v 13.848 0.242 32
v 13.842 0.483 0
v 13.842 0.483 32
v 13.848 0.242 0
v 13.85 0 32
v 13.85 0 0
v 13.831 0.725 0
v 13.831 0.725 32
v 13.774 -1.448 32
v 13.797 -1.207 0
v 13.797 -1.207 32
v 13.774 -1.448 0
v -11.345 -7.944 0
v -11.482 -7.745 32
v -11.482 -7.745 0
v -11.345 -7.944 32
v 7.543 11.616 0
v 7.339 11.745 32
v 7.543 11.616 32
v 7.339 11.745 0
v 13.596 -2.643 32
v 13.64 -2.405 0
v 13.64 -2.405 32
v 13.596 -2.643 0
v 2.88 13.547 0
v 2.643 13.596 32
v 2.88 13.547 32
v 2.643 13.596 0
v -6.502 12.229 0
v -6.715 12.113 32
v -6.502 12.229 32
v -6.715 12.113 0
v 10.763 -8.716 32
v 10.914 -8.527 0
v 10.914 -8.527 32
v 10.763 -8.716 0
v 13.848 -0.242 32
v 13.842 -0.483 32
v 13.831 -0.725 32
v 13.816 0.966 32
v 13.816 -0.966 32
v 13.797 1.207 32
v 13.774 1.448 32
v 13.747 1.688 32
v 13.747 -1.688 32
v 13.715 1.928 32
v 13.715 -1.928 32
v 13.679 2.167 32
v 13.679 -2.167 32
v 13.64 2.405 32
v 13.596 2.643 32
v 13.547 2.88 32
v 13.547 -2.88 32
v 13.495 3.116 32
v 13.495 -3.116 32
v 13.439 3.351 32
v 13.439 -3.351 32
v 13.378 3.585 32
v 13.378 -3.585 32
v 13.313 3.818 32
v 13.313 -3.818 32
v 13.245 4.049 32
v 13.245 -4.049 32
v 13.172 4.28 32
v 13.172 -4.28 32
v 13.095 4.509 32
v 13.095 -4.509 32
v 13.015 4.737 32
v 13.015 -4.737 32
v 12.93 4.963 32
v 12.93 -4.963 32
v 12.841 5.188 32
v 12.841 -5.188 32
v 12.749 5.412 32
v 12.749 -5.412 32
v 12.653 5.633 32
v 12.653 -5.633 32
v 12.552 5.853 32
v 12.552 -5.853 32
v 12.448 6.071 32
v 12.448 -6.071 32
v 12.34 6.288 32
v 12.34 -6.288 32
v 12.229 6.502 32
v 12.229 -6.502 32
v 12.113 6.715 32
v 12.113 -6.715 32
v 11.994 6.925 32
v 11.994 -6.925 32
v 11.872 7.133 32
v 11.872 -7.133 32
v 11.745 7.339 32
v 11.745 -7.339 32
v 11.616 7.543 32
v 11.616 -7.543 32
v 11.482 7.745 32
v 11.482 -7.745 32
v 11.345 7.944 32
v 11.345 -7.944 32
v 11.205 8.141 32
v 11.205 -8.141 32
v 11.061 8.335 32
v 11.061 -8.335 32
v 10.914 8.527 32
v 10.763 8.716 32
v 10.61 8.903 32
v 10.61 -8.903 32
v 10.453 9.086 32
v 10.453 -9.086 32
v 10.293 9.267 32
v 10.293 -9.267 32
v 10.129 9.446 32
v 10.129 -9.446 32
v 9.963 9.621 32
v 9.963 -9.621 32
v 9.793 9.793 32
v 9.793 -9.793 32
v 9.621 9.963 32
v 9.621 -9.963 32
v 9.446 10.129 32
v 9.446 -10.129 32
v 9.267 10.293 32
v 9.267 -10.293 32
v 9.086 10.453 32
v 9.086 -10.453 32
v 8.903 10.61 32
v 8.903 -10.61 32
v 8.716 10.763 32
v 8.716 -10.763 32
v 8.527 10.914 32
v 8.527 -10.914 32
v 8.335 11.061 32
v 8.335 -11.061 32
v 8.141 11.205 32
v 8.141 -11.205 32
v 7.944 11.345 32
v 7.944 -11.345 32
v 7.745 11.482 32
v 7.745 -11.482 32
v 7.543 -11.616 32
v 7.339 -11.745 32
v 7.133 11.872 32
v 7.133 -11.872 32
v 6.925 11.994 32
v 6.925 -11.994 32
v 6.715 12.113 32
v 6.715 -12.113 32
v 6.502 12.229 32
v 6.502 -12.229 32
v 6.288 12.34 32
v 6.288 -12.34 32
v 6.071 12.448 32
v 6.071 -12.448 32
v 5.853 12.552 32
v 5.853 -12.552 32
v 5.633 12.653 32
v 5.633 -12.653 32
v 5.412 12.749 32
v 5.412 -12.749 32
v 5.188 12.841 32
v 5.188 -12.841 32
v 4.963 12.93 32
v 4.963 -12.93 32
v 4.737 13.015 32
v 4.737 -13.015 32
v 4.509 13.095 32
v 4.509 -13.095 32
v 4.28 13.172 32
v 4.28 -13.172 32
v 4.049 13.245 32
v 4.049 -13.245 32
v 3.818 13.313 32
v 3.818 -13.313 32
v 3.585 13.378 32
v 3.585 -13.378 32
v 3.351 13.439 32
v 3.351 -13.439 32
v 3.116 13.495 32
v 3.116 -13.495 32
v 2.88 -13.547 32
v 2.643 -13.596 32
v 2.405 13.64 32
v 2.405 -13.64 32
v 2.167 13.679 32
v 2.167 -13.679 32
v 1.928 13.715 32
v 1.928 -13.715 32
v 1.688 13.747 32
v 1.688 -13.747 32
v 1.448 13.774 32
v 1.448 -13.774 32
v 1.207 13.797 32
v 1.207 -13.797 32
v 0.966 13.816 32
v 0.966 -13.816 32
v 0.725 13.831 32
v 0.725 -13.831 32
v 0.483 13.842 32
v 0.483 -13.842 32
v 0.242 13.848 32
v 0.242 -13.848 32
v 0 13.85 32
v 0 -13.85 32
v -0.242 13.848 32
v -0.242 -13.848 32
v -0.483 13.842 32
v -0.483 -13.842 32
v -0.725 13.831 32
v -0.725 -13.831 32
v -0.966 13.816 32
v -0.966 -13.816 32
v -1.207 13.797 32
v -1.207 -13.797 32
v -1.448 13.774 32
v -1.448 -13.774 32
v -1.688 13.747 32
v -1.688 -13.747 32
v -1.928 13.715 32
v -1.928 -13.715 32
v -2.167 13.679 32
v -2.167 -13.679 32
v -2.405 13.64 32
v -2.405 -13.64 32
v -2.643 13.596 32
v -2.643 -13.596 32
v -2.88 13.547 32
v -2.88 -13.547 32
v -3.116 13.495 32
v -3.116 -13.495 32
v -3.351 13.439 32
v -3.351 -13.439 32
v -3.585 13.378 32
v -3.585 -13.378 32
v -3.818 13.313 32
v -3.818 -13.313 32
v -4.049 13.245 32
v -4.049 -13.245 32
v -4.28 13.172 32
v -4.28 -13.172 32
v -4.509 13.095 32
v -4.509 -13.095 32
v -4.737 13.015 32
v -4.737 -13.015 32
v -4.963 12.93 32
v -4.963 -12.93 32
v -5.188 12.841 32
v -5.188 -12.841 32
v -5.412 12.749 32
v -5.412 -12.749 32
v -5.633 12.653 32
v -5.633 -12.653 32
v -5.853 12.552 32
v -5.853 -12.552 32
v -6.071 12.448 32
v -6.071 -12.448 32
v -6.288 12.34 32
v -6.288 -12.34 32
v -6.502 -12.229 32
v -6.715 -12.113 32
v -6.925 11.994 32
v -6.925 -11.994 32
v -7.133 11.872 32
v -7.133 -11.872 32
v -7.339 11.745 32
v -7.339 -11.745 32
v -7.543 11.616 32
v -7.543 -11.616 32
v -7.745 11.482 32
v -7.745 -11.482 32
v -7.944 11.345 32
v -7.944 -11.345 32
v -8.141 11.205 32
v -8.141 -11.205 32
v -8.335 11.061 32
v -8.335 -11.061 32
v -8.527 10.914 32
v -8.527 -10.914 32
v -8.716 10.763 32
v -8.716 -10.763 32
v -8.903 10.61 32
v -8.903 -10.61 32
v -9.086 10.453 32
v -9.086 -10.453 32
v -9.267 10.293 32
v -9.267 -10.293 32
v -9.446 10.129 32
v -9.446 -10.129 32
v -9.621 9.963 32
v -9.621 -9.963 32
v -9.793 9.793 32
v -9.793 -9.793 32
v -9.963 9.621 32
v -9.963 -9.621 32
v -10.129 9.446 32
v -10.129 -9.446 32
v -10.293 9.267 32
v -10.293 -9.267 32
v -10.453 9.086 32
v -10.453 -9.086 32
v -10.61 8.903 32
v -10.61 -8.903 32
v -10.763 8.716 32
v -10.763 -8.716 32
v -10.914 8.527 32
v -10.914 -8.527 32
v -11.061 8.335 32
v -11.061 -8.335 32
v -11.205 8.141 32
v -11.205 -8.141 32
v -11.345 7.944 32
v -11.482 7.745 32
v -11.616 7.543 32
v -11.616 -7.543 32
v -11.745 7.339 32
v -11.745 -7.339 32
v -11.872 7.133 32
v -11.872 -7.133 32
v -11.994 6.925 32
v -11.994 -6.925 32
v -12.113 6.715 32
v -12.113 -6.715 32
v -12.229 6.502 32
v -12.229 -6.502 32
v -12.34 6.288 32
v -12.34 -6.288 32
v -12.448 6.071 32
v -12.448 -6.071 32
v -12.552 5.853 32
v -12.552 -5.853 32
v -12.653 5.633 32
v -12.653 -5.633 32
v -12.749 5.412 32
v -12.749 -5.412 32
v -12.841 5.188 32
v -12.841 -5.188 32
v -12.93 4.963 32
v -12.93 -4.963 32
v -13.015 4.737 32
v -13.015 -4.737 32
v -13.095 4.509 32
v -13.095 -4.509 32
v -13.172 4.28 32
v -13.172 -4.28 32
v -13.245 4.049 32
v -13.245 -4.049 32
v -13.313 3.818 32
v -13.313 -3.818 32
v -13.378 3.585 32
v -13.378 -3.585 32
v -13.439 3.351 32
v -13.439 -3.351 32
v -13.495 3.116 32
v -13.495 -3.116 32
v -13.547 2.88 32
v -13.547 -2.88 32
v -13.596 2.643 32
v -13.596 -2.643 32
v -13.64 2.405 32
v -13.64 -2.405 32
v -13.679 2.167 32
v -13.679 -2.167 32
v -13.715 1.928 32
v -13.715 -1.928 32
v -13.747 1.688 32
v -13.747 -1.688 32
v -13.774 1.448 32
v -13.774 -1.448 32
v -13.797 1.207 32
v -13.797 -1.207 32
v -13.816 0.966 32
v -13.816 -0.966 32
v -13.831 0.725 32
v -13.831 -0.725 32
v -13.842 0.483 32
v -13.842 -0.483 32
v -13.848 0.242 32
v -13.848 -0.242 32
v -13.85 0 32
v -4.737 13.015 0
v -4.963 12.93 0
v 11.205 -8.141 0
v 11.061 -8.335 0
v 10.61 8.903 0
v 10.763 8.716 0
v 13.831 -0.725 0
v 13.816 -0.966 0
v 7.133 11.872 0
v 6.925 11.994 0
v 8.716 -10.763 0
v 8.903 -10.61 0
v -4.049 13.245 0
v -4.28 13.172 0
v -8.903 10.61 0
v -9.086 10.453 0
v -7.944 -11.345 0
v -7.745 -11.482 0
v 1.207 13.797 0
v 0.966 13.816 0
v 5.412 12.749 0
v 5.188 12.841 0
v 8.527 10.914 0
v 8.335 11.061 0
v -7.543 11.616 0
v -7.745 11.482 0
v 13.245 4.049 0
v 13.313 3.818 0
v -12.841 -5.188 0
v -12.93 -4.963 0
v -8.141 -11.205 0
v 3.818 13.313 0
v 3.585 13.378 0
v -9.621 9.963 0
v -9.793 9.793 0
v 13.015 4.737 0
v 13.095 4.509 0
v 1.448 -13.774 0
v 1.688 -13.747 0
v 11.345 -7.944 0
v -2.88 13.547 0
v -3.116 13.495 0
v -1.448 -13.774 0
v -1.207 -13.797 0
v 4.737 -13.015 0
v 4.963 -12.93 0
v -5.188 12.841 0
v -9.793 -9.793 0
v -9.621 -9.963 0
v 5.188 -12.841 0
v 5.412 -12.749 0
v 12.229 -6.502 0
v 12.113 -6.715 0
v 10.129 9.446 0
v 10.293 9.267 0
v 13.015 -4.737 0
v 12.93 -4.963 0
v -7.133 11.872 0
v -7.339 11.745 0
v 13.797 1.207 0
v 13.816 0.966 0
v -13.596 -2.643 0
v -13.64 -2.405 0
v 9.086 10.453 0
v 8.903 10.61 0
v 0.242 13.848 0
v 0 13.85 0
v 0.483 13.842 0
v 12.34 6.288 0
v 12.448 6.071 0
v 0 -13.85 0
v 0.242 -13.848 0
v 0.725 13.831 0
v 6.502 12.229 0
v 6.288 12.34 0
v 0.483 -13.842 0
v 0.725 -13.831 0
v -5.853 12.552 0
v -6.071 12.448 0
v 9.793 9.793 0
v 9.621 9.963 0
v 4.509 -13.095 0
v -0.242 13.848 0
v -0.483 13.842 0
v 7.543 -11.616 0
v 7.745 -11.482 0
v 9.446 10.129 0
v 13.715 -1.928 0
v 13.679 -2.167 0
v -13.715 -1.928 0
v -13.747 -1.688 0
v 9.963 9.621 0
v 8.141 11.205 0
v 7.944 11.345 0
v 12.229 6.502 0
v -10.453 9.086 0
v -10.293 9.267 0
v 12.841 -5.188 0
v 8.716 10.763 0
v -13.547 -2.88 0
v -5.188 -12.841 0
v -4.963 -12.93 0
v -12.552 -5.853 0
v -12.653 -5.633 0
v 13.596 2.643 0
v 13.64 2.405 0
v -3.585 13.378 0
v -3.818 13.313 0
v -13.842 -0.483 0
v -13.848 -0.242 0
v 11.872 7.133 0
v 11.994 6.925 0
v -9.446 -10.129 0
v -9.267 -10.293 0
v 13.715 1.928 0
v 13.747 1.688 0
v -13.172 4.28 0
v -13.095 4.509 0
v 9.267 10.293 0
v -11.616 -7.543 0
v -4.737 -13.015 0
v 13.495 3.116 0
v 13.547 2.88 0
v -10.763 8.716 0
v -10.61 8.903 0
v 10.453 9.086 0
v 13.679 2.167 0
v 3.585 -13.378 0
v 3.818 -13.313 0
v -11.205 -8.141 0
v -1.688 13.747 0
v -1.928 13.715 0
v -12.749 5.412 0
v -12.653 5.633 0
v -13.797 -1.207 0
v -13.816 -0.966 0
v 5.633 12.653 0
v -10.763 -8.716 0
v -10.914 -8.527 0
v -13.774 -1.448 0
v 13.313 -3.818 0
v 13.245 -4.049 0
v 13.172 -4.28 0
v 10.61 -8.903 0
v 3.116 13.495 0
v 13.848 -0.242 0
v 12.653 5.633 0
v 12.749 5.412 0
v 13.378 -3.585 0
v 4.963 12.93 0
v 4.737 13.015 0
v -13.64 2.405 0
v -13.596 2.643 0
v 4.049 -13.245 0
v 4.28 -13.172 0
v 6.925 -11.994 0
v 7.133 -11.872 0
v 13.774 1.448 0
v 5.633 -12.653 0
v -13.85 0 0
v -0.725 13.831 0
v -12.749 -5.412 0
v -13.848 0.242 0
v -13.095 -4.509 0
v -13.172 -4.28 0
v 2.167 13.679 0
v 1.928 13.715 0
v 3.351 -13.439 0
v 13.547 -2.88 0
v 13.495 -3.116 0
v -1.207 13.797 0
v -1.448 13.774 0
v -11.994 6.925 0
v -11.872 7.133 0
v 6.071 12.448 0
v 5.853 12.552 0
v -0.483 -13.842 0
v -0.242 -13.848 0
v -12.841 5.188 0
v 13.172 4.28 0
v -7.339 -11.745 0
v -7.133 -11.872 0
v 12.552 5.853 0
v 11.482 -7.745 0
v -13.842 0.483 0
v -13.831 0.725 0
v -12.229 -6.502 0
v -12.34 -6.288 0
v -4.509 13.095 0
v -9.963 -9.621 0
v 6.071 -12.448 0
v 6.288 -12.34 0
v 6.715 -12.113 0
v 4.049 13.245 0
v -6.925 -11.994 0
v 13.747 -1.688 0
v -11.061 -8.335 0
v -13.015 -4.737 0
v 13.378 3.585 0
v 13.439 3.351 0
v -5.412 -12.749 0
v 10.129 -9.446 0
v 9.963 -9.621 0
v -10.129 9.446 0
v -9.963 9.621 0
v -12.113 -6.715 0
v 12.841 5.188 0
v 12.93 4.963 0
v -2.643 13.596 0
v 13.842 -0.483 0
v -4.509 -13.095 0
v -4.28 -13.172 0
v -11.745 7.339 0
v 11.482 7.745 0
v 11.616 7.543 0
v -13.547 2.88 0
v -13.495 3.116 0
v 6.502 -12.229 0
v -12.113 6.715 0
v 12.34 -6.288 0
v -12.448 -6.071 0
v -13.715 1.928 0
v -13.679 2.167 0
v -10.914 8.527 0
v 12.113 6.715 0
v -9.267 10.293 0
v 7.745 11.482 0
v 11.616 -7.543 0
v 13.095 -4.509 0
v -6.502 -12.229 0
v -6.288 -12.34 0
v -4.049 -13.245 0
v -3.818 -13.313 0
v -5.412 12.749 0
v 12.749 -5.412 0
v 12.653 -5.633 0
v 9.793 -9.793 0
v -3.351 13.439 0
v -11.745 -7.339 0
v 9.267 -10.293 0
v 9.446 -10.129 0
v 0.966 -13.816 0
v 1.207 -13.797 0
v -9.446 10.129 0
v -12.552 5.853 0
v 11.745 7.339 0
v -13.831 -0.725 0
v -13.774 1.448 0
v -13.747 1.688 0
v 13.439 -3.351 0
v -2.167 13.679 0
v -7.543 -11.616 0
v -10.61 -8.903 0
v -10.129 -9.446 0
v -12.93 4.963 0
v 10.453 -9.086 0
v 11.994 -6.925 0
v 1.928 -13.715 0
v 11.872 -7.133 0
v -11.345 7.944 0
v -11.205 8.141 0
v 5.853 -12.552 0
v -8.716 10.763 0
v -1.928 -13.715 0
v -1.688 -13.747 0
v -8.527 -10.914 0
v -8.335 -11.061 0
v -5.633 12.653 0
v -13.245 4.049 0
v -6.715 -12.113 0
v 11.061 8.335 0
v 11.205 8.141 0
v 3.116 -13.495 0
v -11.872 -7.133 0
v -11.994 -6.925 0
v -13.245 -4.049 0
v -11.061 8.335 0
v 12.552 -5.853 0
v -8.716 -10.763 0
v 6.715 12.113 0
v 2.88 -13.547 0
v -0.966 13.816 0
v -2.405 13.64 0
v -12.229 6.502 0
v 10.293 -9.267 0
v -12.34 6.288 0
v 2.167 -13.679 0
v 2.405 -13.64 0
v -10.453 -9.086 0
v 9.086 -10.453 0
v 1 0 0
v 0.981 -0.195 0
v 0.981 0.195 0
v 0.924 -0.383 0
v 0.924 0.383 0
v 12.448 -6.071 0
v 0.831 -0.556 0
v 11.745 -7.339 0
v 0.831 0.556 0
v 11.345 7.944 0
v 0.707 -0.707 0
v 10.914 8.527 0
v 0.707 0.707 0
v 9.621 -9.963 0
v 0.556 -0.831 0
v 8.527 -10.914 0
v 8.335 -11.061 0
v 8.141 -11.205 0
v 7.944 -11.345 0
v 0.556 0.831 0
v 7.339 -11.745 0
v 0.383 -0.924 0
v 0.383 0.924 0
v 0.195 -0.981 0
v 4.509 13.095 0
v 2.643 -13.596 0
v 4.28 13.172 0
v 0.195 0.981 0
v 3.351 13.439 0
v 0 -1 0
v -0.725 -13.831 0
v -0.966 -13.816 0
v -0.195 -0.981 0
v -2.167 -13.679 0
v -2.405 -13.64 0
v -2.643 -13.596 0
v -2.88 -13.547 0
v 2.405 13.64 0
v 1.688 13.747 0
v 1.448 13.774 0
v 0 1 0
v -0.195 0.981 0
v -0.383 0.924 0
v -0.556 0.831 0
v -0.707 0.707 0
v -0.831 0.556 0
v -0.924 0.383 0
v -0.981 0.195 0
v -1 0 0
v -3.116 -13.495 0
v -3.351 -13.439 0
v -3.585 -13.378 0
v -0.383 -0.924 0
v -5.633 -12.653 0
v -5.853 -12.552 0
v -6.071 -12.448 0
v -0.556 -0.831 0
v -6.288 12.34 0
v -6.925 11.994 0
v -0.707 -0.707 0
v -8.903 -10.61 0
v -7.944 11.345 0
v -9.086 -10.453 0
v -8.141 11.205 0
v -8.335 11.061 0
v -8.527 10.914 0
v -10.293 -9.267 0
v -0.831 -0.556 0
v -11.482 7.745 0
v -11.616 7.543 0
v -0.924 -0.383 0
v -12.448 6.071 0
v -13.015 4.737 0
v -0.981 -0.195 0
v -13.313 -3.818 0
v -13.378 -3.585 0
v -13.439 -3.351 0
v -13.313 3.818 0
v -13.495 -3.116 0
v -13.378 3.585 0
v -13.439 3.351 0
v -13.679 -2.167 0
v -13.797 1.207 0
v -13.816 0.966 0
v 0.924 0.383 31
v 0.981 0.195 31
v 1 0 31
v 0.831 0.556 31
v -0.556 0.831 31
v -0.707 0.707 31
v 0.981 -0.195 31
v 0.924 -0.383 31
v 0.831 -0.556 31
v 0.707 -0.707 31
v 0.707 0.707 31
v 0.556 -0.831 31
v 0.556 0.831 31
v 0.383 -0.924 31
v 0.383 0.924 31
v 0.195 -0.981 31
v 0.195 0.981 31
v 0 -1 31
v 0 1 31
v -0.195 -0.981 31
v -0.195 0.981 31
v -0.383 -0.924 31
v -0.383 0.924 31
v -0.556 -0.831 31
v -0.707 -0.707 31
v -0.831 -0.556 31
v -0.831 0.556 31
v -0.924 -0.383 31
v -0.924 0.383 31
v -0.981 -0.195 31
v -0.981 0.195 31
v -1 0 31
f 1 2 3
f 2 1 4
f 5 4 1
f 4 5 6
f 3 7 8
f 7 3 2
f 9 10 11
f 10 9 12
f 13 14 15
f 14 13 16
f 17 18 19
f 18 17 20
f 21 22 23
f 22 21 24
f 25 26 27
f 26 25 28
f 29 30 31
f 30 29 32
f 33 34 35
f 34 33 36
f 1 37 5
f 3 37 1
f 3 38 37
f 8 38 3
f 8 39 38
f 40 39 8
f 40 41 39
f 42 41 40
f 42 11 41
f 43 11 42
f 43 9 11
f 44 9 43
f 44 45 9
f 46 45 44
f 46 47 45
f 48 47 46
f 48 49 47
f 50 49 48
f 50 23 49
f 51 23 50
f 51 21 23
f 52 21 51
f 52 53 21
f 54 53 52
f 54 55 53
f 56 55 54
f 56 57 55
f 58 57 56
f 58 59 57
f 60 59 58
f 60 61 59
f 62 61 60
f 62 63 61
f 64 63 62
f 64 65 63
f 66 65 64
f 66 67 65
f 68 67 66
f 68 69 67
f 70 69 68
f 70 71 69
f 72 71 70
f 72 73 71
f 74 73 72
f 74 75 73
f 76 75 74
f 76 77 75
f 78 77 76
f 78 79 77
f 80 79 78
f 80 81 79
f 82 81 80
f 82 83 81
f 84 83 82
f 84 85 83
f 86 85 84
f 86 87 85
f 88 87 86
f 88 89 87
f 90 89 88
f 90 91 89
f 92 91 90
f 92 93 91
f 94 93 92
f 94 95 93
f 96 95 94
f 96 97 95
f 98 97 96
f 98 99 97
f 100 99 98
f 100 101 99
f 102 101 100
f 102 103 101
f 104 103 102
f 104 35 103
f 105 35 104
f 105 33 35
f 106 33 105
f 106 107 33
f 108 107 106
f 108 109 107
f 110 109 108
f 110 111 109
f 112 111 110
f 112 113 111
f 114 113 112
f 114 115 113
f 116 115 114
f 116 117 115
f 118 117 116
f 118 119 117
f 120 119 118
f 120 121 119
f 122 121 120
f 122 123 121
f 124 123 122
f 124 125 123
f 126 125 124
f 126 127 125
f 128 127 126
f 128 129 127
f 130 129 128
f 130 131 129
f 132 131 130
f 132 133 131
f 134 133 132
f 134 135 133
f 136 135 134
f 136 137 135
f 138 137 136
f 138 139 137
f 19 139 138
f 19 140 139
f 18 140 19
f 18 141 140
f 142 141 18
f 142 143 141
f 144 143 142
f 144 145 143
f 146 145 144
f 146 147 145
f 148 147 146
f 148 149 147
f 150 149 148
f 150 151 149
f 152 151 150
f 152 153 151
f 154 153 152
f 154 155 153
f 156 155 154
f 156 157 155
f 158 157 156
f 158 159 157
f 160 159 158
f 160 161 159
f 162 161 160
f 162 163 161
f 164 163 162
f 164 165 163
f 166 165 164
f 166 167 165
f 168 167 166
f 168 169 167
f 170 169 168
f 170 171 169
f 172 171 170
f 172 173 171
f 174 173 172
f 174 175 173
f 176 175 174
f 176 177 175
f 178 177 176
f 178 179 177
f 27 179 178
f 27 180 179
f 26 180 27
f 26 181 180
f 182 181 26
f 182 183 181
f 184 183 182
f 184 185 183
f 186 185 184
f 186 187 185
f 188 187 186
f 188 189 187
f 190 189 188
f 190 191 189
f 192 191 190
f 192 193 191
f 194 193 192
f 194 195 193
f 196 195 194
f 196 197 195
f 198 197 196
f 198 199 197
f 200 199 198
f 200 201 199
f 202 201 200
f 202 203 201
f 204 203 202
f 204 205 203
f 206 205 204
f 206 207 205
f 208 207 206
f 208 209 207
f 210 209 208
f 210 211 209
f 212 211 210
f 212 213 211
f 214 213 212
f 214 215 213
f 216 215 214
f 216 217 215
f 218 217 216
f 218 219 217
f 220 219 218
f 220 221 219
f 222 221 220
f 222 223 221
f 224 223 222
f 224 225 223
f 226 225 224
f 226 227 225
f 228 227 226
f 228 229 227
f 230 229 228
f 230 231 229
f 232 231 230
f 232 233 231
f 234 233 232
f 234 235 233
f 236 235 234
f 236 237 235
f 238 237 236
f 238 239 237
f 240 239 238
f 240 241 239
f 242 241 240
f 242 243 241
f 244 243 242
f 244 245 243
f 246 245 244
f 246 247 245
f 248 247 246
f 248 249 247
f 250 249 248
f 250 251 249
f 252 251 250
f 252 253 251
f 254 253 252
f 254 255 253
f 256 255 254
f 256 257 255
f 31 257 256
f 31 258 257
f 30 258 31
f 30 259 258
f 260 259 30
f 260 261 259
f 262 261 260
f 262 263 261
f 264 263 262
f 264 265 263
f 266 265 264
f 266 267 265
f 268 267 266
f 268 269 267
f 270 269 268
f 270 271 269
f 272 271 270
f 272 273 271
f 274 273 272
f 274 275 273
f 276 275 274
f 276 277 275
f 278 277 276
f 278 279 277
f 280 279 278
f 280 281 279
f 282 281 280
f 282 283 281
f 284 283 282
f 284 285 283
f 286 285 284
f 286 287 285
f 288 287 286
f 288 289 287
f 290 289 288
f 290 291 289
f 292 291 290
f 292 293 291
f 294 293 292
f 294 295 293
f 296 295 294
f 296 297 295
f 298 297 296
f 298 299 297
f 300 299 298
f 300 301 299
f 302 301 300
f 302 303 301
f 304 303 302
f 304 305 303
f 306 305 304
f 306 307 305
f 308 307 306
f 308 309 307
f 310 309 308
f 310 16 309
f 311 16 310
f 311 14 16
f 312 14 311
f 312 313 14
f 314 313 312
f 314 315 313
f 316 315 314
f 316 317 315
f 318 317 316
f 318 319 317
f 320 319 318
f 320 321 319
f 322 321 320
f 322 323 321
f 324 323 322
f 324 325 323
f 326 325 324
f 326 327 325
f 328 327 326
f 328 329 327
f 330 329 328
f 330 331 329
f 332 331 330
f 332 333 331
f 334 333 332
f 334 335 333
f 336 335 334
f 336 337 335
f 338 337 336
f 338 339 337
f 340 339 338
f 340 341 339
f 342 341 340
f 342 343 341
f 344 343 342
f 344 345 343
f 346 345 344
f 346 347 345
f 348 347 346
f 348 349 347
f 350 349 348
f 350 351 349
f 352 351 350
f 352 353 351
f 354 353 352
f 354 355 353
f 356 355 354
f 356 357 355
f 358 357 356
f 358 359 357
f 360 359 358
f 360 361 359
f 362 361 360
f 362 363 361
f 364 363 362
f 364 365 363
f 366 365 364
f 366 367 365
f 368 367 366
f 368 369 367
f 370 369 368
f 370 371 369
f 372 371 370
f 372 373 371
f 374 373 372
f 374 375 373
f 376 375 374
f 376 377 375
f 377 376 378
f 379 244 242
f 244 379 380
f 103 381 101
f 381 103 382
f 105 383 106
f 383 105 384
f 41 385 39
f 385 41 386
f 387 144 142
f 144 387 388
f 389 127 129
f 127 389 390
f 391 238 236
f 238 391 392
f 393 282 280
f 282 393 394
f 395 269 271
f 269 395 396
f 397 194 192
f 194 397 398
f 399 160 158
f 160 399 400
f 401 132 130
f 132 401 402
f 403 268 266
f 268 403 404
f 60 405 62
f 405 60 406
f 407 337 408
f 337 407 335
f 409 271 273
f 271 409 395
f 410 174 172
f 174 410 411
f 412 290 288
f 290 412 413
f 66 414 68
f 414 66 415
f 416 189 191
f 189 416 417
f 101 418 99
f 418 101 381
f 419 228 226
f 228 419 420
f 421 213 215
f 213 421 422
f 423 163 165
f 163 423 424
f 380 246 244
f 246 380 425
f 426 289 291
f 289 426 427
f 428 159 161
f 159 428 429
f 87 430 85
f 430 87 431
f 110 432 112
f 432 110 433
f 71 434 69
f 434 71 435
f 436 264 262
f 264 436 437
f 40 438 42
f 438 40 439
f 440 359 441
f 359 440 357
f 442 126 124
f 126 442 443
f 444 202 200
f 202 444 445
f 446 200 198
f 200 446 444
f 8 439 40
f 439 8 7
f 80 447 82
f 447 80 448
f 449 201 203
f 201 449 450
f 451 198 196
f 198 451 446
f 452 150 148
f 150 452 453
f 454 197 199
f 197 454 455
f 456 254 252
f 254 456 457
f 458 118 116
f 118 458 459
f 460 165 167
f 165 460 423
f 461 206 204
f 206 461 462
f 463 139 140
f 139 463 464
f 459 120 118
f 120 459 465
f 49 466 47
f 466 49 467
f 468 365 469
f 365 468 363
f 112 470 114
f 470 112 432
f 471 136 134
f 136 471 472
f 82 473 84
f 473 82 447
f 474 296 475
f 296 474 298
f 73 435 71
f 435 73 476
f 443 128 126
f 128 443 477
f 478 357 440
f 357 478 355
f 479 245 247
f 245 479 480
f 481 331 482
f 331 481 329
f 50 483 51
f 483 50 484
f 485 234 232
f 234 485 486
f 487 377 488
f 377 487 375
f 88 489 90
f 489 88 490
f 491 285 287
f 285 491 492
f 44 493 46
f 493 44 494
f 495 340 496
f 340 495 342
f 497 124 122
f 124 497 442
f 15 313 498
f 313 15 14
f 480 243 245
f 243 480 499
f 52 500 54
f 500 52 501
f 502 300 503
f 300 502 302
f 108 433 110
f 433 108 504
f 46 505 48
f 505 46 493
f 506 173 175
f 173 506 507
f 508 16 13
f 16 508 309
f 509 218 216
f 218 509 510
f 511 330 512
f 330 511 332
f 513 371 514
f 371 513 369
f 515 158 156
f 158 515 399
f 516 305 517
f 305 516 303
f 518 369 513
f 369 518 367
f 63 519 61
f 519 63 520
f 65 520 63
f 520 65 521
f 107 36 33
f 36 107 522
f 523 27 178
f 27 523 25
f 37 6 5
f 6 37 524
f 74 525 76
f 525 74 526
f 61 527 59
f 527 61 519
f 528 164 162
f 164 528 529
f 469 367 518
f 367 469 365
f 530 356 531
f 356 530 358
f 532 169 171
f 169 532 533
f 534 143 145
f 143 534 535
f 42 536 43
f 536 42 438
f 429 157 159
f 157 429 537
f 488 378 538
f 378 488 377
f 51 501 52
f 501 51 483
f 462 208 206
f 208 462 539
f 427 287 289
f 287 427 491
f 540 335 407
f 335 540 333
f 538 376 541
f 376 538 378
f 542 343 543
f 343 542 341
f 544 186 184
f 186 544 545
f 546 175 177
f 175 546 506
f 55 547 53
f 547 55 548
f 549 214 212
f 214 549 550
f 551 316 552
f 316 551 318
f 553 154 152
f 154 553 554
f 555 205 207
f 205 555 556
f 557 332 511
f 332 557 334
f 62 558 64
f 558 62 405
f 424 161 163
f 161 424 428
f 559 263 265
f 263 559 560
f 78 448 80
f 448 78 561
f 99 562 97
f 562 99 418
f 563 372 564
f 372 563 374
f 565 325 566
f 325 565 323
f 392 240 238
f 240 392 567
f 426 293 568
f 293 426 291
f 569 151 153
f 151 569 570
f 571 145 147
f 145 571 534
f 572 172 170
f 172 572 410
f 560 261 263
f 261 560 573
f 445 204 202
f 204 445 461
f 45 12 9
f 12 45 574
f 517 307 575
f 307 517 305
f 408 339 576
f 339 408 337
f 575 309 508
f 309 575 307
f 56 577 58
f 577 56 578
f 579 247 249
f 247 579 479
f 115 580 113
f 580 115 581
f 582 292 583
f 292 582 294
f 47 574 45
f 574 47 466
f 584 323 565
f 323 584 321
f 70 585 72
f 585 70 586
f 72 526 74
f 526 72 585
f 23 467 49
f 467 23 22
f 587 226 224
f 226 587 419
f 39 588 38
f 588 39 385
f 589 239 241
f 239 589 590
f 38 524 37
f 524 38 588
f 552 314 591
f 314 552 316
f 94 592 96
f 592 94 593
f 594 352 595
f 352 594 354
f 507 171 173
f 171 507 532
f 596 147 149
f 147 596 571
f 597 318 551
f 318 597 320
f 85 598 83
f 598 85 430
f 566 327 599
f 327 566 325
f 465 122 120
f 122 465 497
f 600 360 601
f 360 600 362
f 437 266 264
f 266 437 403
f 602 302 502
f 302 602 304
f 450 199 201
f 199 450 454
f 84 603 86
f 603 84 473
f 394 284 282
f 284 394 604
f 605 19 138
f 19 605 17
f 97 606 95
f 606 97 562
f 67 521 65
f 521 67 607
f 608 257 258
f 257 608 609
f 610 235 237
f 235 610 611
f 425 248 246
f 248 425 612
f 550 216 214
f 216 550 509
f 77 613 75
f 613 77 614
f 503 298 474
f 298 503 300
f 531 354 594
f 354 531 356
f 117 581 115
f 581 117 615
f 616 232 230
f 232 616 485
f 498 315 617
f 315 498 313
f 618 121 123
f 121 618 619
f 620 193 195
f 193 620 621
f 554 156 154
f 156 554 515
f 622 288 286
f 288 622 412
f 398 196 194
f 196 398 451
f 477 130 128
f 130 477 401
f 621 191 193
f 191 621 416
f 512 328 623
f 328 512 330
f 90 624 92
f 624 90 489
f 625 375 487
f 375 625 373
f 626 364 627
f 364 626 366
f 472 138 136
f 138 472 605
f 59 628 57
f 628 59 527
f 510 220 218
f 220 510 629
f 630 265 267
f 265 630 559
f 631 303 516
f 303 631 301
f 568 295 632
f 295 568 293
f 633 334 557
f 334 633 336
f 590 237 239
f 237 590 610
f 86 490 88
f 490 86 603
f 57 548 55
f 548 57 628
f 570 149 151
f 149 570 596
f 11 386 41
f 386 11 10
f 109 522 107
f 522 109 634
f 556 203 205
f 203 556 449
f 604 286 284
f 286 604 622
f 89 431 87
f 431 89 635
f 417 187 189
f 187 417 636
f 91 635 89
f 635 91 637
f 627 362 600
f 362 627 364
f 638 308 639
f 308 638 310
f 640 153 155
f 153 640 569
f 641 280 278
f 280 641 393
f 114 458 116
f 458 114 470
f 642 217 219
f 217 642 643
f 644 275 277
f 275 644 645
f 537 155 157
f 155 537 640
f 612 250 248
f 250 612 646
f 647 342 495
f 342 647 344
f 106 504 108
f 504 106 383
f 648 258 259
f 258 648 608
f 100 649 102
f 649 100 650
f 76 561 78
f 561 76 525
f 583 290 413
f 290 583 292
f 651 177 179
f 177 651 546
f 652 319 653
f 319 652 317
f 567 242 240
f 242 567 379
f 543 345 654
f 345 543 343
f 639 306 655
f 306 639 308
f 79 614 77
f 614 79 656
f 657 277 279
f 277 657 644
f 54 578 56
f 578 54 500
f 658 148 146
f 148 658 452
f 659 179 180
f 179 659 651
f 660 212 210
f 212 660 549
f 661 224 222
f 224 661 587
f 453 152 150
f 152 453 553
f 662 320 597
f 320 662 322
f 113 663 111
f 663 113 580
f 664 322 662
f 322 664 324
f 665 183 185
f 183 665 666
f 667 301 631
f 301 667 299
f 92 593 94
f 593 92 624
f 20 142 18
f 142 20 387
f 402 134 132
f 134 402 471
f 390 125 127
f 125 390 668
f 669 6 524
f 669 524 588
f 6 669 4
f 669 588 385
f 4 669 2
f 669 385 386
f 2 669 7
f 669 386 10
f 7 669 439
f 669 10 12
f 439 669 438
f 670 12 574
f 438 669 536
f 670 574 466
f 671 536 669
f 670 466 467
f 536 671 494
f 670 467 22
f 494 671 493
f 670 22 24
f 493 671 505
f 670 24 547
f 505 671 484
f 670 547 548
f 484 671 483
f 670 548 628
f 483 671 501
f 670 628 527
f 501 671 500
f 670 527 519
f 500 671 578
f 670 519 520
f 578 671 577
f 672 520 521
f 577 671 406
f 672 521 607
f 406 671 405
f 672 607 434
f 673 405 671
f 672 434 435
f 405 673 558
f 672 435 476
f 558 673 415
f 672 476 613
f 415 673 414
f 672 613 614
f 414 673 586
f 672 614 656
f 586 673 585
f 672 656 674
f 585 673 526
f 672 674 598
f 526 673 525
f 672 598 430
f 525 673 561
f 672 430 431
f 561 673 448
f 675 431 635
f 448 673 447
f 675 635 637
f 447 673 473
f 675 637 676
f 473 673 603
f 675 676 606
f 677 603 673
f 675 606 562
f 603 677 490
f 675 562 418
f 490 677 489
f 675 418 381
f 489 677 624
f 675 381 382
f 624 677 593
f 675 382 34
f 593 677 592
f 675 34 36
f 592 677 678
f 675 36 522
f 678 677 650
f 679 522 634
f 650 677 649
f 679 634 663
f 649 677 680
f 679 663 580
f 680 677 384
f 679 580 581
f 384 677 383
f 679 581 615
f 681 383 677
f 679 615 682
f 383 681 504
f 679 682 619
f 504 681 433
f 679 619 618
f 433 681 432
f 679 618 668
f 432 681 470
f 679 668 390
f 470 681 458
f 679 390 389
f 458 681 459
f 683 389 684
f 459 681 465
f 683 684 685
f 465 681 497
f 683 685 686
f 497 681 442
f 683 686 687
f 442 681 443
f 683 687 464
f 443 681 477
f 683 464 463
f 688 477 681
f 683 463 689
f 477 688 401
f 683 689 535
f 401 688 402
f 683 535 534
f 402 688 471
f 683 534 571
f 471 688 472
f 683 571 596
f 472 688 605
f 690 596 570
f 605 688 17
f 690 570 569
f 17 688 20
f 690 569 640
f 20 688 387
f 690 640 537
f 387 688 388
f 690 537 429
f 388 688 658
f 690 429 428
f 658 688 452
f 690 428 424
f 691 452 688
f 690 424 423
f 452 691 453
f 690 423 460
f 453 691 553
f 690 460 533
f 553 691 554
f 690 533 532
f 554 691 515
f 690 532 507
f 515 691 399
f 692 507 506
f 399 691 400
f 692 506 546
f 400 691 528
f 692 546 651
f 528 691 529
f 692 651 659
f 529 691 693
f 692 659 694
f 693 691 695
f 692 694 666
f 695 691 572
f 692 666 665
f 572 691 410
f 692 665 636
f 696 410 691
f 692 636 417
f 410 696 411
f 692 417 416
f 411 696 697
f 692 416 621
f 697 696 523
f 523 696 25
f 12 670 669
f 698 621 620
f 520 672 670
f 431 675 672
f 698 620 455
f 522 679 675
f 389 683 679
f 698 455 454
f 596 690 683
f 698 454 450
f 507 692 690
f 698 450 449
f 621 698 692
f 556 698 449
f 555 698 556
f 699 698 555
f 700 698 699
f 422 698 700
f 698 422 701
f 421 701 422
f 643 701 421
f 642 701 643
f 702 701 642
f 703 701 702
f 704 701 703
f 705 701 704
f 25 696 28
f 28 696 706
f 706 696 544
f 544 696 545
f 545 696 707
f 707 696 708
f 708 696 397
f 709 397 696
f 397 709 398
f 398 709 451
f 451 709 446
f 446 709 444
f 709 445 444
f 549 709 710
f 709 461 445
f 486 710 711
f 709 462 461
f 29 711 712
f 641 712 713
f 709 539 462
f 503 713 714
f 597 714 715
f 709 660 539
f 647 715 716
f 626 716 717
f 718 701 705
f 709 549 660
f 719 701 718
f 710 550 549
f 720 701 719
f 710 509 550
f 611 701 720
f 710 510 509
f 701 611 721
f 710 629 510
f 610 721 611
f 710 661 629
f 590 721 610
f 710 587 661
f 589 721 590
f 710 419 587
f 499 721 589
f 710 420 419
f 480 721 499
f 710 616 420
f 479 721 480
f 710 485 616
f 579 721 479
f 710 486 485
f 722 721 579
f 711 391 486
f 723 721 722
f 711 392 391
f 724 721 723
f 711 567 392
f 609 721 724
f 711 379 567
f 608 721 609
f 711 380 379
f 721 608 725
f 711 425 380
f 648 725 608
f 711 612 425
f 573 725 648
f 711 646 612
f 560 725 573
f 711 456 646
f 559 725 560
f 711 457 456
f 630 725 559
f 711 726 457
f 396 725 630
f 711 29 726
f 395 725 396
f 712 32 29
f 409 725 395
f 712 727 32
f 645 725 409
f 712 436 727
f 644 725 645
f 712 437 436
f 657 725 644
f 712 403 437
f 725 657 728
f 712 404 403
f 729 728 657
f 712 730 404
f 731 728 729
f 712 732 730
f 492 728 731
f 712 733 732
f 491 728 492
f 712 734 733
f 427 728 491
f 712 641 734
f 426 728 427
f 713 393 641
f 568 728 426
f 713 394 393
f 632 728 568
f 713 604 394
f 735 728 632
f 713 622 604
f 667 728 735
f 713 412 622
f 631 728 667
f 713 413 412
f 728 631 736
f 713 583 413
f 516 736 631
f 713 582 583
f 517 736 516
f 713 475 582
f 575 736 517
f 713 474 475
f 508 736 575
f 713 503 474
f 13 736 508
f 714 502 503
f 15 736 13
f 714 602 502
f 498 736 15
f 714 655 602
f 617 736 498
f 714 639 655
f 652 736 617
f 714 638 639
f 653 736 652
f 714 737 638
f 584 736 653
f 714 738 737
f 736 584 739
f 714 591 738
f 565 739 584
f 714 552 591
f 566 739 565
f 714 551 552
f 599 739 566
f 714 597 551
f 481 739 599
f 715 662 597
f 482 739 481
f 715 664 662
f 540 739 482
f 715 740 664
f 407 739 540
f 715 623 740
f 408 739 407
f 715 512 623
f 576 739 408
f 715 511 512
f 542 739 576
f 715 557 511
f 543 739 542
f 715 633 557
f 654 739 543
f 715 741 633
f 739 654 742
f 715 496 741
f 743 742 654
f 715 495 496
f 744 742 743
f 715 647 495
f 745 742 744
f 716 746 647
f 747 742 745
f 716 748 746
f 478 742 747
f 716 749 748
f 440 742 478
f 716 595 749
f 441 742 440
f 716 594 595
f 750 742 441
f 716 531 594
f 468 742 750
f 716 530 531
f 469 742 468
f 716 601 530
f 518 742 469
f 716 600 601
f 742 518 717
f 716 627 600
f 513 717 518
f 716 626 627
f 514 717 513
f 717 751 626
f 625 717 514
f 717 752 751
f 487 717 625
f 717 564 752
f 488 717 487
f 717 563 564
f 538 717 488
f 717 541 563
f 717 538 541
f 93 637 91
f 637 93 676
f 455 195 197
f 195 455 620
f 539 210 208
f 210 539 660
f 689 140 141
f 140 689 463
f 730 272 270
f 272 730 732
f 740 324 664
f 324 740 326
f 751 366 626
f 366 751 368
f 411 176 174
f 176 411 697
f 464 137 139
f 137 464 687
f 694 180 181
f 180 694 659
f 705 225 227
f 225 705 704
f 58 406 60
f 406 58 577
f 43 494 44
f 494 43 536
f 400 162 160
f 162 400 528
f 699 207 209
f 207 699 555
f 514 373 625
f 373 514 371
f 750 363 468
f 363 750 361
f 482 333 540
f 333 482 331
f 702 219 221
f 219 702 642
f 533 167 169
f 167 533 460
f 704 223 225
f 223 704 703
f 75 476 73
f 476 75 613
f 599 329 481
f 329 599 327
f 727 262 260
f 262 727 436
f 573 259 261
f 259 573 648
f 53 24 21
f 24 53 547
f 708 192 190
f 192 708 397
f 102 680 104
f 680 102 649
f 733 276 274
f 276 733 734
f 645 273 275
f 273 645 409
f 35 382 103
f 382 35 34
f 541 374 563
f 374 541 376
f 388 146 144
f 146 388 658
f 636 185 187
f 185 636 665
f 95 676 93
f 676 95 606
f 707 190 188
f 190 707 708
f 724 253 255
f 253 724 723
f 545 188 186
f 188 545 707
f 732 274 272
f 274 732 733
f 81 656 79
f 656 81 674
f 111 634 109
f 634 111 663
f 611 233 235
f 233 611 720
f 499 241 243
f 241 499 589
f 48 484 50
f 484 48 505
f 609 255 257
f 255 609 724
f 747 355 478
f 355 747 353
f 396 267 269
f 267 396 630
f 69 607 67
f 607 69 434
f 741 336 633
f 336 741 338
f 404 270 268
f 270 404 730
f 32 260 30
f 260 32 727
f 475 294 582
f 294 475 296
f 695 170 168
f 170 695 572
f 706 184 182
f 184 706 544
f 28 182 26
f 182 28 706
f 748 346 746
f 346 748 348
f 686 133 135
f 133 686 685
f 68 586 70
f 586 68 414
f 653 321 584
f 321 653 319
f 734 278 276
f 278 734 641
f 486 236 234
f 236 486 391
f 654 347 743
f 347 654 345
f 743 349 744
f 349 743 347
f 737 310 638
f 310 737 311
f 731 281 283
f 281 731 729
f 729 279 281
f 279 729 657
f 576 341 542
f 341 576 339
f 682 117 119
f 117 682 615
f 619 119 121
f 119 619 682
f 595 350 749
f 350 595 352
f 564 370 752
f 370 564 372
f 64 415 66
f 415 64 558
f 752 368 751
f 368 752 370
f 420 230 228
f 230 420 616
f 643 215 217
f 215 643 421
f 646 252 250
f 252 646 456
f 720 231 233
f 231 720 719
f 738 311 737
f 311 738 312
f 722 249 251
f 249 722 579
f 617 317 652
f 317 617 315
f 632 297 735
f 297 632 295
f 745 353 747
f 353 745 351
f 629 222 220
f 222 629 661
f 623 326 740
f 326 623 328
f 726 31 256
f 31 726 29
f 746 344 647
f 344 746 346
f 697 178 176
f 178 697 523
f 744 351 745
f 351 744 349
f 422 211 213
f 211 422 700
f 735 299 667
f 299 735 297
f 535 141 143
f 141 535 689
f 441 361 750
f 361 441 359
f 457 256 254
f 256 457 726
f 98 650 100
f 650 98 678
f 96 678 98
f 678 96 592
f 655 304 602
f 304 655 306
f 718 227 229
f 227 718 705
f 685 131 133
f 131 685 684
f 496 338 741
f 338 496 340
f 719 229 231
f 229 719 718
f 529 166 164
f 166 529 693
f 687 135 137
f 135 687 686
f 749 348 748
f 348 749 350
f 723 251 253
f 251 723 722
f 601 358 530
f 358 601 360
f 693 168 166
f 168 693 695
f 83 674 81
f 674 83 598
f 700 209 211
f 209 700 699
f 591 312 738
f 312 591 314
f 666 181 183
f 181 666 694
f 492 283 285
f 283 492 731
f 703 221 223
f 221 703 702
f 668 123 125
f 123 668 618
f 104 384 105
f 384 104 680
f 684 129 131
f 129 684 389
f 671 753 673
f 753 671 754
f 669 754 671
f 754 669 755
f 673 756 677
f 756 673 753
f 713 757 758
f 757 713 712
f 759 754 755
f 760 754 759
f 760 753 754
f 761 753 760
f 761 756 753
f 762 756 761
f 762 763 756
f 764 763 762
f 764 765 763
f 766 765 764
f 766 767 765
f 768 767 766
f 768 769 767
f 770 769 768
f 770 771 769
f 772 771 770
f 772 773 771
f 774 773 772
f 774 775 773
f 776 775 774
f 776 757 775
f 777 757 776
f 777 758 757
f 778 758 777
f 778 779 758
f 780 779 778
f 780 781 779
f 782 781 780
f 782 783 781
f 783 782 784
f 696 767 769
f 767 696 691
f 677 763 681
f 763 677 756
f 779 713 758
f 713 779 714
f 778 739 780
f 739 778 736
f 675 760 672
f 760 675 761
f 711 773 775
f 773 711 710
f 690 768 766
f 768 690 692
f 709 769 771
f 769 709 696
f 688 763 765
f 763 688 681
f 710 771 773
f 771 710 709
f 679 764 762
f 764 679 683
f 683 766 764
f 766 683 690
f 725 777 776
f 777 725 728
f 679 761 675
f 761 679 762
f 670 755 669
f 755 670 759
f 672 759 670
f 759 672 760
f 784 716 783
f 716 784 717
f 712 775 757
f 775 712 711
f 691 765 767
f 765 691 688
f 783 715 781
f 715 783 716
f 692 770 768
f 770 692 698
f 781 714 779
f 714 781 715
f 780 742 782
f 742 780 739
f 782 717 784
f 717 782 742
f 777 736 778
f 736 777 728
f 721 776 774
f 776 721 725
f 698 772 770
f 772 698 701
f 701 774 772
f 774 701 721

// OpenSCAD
height = 32;
diameter = 27.7;
screw_diameter = 2;
$fs = 0.2;
$fa = 1;

difference() {
	cylinder(h=height, r=diameter / 2);
	cylinder(h=height- 1, r=screw_diameter / 2);
}
